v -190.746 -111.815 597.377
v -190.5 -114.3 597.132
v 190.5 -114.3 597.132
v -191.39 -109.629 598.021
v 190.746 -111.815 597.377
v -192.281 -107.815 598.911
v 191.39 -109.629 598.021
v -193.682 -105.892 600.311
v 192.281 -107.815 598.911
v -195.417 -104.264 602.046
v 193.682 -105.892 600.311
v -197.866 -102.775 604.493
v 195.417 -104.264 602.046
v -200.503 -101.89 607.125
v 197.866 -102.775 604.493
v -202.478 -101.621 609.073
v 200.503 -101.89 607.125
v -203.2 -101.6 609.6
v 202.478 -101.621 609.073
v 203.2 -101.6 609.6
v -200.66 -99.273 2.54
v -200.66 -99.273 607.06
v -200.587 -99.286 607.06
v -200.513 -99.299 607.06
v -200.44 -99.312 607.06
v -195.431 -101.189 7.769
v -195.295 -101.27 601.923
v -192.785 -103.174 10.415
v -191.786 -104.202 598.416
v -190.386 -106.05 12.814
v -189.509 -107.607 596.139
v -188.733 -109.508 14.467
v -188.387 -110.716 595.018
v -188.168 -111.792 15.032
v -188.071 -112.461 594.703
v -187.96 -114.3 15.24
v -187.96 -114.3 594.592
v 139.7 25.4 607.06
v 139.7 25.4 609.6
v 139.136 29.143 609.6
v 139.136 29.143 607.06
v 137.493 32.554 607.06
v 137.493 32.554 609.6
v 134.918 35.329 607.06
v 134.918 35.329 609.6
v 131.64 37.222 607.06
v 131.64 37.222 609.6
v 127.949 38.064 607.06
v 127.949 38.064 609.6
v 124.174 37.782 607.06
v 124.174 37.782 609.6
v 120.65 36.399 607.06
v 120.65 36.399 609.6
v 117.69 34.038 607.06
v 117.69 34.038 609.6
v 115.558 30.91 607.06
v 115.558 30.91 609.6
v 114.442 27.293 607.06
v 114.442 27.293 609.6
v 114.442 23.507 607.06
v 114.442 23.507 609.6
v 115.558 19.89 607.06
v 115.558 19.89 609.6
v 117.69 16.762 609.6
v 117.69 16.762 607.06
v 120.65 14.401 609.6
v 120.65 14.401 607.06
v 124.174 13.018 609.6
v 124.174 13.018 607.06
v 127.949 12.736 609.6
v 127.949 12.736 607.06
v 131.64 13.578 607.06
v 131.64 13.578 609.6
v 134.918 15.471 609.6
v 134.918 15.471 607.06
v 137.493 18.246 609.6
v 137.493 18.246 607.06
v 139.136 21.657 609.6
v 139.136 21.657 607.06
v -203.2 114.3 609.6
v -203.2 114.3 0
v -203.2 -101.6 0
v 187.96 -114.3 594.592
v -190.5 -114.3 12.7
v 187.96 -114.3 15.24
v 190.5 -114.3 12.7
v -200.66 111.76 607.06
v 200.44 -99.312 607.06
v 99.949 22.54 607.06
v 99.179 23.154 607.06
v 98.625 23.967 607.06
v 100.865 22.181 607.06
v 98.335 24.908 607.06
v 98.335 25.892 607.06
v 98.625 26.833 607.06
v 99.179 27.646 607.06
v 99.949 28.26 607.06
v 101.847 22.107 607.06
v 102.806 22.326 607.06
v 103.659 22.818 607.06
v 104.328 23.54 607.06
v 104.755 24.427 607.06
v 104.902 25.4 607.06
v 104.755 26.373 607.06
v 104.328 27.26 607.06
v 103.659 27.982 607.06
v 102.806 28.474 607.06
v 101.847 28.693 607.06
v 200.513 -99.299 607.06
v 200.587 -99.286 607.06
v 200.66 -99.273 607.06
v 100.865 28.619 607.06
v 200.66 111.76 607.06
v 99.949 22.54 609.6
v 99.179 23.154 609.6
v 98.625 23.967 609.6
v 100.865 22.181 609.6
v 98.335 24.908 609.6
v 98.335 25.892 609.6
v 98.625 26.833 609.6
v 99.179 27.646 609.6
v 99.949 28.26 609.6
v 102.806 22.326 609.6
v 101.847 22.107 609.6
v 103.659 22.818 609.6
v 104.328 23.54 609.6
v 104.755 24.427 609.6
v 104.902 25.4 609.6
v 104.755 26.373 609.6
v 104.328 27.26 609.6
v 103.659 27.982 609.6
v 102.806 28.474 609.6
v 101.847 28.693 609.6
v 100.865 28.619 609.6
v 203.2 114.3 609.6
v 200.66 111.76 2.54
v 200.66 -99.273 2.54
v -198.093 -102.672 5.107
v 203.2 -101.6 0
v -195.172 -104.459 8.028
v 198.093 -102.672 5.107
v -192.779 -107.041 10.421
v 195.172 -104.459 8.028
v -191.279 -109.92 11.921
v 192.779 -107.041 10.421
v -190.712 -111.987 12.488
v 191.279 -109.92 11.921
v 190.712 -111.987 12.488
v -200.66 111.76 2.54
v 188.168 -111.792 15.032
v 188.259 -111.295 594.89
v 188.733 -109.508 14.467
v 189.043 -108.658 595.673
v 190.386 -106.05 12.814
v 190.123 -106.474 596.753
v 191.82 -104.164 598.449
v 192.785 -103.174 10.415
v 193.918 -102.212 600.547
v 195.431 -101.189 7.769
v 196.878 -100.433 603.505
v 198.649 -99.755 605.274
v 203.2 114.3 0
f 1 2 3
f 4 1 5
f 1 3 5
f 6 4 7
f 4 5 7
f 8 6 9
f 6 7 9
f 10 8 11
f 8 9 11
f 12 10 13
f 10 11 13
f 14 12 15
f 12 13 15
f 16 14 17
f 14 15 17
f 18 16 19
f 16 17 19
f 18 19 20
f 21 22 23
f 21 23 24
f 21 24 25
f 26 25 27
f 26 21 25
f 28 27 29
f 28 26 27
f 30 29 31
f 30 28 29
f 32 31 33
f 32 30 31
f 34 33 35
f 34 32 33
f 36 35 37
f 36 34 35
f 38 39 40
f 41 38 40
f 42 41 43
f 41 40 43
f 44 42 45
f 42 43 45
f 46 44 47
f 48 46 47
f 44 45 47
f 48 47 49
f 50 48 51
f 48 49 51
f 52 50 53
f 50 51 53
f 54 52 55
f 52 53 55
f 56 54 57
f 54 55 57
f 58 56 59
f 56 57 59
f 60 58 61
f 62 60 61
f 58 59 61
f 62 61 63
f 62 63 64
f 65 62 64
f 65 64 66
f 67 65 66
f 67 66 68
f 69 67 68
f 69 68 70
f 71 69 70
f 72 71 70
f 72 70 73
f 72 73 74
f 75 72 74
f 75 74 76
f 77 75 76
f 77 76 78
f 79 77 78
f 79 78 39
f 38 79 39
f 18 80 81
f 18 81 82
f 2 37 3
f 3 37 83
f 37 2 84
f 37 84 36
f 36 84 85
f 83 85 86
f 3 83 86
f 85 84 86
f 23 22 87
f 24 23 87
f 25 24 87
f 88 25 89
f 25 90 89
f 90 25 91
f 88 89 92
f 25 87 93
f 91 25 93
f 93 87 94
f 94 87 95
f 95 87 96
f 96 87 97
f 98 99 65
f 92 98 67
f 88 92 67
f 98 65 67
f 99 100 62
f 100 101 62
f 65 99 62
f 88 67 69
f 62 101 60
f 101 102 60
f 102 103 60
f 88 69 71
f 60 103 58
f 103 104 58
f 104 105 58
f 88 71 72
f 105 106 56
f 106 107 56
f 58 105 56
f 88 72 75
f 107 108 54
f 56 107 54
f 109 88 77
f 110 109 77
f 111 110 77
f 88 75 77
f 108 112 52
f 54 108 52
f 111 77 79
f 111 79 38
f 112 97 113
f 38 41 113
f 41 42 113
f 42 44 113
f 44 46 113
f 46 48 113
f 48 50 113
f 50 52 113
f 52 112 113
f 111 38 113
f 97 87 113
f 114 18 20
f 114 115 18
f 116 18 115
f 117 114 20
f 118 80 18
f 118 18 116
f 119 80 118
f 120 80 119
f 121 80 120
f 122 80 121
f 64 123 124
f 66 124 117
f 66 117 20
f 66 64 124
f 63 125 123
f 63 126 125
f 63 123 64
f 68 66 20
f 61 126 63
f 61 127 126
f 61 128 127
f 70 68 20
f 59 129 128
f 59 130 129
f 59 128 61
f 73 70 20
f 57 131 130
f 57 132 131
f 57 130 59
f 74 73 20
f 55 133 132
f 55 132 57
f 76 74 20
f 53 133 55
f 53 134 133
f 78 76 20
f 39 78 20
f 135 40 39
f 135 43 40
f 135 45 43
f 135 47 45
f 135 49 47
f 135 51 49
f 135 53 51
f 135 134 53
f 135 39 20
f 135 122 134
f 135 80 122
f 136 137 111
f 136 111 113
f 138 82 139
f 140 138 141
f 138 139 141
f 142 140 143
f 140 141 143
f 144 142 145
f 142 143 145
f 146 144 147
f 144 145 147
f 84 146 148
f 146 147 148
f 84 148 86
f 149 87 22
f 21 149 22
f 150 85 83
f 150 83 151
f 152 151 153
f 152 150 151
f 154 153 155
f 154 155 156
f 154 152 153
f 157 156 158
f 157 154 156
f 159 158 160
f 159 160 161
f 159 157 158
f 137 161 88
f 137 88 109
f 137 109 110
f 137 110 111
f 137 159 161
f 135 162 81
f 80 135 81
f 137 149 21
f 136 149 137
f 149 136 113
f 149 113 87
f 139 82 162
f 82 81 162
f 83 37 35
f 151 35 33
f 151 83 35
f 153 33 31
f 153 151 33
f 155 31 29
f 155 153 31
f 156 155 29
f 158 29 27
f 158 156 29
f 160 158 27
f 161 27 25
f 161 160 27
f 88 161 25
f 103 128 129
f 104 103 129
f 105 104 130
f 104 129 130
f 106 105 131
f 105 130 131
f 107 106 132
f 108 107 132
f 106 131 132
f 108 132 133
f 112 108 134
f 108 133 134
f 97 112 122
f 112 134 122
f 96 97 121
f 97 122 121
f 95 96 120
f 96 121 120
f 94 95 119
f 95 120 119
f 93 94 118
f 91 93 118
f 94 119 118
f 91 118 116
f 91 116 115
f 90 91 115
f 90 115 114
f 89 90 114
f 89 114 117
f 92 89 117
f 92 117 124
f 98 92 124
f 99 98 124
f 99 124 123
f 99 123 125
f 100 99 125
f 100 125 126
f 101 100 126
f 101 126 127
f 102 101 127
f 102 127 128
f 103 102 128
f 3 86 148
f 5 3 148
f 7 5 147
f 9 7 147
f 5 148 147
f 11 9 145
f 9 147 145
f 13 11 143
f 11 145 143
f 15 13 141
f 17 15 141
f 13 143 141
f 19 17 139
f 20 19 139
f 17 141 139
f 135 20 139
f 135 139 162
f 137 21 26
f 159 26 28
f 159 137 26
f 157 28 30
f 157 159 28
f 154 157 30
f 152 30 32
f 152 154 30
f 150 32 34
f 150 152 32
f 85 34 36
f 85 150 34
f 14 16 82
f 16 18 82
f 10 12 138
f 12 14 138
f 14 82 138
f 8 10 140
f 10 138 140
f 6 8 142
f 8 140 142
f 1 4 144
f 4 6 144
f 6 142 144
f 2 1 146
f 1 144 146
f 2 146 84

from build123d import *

# Parameters (mm, degrees)
F1_DEPTH = 609.6
F2_R     = 12.7
F3_DEPTH = 406.401
F4_T     = -2.54
F5_R     = 12.7
F5_R_2   = 3.302
F6_DEPTH = 25.4


with BuildPart() as f1:
    # F0 (on Top) → F1 (new body)
    with BuildSketch(Plane.XY):
        with BuildLine():
            Line((203.2, -101.6), (203.2, 114.3))
            Line((203.2, 114.3), (-203.2, 114.3))
            Line((-203.2, 114.3), (-203.2, -101.6))
            ThreePointArc((-203.2, -101.6), (-194.2197438789, -105.3197438789), (-190.5, -114.3))
            Line((-190.5, -114.3), (190.5, -114.3))
            ThreePointArc((190.5, -114.3), (194.2197438789, -105.3197438789), (203.2, -101.6))
        make_face()
    extrude(amount=F1_DEPTH)

    # F2 (on face) → F3 (cut, through all)
    with BuildSketch(Plane.YZ.offset(203.2)):
        with Locations((-114.2978898402, 609.8315029268)):
            Circle(F2_R)
        with Locations((-114.3, 0)):
            Circle(F2_R)
    extrude(amount=-F3_DEPTH, mode=Mode.SUBTRACT)

    # F4
    f4_openings = [f1.faces().sort_by_distance(p)[0] for p in [
        (0, -114.3, 304.915752),
    ]]
    offset(amount=F4_T, openings=f4_openings)

    # F5 (on face) → F6 (cut)
    with BuildSketch(Plane.XY.offset(609.6)):
        with Locations((127, 25.4)):
            Circle(F5_R)
        with Locations((101.6, 25.4)):
            Circle(F5_R_2)
    extrude(amount=-F6_DEPTH, mode=Mode.SUBTRACT)


solid = f1.part
